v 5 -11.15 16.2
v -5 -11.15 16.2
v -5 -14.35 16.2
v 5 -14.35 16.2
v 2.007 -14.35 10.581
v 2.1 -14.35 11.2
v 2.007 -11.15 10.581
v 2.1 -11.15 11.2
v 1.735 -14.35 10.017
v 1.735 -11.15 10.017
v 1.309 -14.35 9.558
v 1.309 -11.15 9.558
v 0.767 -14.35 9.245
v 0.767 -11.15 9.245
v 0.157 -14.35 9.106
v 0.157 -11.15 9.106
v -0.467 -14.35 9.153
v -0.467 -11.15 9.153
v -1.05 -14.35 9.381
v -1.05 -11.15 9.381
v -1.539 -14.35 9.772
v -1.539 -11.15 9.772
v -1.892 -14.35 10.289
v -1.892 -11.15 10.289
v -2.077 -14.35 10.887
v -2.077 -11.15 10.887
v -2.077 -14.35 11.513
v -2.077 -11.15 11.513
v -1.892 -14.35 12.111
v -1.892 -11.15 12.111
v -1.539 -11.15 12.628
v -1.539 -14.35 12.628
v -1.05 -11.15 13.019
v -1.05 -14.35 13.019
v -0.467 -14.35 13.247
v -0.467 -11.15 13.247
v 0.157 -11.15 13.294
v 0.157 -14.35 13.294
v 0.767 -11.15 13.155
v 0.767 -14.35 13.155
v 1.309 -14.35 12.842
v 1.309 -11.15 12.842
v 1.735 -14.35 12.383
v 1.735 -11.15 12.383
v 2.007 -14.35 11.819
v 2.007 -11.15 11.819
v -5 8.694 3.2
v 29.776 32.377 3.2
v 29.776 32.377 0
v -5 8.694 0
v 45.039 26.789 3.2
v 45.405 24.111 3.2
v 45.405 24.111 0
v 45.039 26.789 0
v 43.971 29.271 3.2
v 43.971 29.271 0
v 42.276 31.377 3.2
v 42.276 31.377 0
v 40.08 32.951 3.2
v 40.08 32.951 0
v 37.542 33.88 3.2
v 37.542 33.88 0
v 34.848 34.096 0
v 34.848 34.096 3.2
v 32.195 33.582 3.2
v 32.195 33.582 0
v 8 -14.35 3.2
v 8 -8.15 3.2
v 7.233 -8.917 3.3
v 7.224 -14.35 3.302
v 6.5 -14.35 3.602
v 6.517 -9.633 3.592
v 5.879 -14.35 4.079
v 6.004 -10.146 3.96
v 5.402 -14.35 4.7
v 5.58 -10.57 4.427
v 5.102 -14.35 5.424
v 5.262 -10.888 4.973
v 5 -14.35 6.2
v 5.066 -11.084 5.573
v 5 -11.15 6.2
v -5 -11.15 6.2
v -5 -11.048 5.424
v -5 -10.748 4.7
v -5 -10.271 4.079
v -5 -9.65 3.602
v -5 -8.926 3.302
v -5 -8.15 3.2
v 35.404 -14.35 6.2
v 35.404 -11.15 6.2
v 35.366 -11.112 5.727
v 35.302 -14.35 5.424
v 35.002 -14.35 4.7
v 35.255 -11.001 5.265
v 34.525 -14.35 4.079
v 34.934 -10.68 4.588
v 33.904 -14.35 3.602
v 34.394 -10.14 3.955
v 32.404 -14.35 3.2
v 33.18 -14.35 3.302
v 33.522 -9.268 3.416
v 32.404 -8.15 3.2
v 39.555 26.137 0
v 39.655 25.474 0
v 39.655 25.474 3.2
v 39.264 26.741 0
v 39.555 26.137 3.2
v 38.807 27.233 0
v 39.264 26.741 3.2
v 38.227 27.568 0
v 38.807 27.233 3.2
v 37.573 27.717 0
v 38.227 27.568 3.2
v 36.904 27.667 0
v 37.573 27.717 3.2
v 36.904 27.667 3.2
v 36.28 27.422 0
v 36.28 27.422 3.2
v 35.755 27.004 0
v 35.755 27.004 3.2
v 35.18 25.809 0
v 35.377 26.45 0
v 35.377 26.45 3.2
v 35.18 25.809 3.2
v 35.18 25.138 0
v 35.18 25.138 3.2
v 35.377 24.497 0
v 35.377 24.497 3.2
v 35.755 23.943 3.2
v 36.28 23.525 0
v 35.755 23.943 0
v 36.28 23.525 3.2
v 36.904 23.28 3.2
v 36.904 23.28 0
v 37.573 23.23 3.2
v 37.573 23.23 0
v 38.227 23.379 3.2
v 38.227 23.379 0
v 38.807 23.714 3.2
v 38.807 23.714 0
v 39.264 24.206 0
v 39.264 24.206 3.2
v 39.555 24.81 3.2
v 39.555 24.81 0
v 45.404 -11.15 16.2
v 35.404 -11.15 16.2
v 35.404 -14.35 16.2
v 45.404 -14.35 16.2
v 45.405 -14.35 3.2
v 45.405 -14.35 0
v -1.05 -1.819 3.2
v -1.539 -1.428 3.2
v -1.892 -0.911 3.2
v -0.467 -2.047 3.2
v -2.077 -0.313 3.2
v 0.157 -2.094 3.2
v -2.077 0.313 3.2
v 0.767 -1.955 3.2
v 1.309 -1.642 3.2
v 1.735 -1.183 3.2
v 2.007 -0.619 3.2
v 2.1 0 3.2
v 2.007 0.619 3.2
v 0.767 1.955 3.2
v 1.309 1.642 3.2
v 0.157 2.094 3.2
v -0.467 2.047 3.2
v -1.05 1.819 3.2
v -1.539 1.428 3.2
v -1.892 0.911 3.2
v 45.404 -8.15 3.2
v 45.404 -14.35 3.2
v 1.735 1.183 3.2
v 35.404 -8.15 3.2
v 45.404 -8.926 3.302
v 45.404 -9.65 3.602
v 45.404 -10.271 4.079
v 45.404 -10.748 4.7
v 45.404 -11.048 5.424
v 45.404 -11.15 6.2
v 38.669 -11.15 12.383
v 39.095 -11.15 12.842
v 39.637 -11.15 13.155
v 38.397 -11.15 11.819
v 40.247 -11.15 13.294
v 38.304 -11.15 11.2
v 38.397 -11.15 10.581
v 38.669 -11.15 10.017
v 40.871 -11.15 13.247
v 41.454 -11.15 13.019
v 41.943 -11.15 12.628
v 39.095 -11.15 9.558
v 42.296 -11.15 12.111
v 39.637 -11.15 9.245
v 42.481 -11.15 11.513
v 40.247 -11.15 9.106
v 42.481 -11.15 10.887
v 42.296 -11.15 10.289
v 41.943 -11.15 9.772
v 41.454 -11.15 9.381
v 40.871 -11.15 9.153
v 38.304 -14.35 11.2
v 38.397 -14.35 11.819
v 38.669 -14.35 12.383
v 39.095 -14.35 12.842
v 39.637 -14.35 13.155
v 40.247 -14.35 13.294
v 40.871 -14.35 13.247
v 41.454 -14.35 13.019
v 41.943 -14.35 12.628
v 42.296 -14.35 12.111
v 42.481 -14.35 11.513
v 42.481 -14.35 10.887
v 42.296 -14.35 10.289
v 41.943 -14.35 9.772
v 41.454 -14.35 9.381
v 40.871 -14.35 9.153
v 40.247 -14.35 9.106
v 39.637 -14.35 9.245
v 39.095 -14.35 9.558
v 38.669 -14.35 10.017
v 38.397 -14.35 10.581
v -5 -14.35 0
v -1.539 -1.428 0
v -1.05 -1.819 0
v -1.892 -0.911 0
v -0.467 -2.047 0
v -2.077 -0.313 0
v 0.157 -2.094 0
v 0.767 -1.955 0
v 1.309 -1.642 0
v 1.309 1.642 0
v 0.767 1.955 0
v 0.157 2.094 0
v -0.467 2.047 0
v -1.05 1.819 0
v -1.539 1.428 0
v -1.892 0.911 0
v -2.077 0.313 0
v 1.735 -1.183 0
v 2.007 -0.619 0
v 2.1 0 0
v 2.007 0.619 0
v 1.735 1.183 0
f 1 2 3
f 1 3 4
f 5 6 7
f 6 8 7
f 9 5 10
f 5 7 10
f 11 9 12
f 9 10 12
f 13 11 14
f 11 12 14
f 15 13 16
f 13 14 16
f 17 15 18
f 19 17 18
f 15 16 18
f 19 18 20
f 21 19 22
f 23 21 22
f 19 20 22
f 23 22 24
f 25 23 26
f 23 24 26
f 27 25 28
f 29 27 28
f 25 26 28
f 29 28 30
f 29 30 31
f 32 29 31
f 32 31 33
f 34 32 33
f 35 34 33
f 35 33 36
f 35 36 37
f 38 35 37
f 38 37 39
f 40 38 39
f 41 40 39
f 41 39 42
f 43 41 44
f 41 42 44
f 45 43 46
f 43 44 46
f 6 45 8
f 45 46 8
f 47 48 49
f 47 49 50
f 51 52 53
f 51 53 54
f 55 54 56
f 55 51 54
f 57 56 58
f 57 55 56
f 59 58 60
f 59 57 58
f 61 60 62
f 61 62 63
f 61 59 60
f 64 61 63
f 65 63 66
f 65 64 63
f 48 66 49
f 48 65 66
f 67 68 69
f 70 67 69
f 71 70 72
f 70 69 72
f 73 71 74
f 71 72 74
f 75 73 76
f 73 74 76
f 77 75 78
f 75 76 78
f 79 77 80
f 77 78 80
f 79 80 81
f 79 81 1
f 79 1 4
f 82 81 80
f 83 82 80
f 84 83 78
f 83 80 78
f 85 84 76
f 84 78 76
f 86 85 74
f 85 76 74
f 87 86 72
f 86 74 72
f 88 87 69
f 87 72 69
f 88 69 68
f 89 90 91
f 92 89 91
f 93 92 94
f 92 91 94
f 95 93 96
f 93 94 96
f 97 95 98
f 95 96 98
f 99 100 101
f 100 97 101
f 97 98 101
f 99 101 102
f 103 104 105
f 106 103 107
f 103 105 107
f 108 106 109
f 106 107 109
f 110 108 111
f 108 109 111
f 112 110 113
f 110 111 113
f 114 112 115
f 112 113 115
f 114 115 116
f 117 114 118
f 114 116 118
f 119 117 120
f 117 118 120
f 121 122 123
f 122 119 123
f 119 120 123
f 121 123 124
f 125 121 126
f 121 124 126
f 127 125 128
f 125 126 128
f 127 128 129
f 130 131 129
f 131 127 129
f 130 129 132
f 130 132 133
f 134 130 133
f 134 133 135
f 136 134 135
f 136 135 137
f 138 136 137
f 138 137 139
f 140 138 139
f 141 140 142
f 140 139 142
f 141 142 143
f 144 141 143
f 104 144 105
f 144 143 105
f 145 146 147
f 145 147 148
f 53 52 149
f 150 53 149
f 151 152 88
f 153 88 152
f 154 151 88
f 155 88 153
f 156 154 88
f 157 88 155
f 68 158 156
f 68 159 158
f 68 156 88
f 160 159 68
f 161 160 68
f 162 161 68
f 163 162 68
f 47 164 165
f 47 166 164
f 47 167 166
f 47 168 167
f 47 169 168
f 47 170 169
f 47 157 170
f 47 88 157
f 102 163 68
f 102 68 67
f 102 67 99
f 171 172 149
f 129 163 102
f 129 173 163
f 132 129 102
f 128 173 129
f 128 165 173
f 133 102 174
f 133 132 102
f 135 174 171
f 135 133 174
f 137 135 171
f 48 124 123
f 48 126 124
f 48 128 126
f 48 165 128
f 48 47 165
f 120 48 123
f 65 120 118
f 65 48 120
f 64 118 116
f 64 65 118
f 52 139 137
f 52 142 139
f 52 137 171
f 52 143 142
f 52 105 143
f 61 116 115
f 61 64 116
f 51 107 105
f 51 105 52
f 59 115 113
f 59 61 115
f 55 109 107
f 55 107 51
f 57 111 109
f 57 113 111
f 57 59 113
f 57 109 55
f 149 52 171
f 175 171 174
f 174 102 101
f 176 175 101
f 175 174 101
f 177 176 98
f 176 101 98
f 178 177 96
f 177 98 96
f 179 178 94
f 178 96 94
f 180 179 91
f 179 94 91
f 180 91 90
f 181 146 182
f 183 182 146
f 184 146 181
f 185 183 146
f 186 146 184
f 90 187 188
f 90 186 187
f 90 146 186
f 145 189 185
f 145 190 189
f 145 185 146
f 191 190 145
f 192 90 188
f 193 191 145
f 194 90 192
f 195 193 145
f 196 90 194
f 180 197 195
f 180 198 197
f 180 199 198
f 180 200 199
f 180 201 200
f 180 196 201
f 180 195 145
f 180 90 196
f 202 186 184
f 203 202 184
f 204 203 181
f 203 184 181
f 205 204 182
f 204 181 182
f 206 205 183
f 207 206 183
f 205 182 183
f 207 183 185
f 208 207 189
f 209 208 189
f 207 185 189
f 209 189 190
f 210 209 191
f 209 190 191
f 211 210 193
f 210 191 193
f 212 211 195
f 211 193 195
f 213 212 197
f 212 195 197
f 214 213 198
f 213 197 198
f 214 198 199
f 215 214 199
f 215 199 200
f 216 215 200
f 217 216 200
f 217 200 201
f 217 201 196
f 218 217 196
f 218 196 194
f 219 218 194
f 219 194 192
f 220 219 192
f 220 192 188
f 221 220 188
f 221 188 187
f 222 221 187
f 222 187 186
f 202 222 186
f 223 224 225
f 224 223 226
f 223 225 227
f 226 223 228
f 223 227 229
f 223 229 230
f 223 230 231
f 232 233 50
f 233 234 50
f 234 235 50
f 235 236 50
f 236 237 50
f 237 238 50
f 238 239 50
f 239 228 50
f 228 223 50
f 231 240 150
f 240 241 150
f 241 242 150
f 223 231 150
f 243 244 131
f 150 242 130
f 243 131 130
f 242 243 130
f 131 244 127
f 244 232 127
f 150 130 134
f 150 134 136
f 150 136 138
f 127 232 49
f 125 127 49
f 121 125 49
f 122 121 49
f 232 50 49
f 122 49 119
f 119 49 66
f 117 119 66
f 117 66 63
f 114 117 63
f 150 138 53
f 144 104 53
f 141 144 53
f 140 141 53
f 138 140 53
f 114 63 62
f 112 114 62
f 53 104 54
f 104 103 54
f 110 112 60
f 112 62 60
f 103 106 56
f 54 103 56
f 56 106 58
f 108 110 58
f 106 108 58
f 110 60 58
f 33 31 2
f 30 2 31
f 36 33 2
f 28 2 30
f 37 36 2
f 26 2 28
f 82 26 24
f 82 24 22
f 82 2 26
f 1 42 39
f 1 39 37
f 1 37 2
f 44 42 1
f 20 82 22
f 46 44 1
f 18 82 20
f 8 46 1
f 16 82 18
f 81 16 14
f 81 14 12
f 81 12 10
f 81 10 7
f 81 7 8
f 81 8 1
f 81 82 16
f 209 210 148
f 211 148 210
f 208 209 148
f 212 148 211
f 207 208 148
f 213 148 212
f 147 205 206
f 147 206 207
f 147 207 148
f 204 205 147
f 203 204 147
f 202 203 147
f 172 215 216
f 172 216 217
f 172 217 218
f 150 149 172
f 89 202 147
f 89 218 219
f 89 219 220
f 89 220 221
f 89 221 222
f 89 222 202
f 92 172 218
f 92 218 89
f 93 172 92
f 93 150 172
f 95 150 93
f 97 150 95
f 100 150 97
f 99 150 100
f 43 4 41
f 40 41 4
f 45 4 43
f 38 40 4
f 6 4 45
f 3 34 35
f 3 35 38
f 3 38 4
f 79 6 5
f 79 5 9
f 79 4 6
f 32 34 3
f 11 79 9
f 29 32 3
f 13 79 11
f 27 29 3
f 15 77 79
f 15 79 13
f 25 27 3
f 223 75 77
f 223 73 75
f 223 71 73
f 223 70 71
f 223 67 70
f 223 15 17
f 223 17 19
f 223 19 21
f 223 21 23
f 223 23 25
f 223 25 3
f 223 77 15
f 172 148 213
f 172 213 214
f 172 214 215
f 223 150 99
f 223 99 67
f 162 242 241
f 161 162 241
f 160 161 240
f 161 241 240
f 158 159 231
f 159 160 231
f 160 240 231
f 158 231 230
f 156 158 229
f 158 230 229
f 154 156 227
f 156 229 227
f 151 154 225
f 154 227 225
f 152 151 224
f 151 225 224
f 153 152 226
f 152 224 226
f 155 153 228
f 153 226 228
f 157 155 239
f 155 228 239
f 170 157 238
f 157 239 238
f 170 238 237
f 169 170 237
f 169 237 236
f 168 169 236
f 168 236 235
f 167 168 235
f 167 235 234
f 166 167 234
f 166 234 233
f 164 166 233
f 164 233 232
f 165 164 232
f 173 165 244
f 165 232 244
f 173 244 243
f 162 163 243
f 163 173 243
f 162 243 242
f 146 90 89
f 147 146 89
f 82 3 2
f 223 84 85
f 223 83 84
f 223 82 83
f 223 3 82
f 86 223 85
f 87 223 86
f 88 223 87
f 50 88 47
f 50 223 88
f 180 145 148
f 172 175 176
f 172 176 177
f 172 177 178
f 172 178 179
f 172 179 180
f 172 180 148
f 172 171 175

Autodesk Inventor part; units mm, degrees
ref_plane "YZ Plane" through (0, 0, 0) normal (1, 0, 0) x (0, 1, 0)
ref_plane "XZ Plane" through (0, 0, 0) normal (0, 1, 0) x (-1, 0, 0)
ref_plane "XY Plane" through (0, 0, 0) normal (0, 0, 1) x (1, 0, 0)
sketch "Эскиз1" plane through (0, 0, 0) normal (0, 0, 1) x (1, 0, 0)
  circle A0 centre (0, 0) radius 2.1
  line L0 (-5, 14.35) -> (5, 14.35)
  line L1 (5, 14.35) -> (5, -14.35)
  line L2 (5, -14.35) -> (-5, -14.35)
  line L3 (-5, -14.35) -> (-5, 14.35)
  line L4 (-5, 14.35) -> (5, -14.35) construction
  line L5 (5, 14.35) -> (-5, -14.35) construction
  line L6 (-5, 7) -> (5, 7)
  dimension "d0" = 4.2
  dimension "d2" = 10
  dimension "d3" = 28.7
  dimension "d4" = 7
extrude "Выдавливание1" add sketch "Эскиз1" along normal blind 3.2 contours L6 L1 L2 L3
sketch "Эскиз2" plane through (0, 0, 3.2) normal (0, 0, 1) x (1, 0, 0)
  line L0 (5, -14.35) -> (5, 7) projected
  line L1 (5, -14.35) -> (-5, -14.35)
  line L2 (-5, -14.35) -> (-5, -11.15)
  line L3 (-5, -11.15) -> (5, -11.15)
  line L4 (5, -11.15) -> (5, -14.35)
  point P0 (0, 0)
  point P1 (5, -11.15)
  dimension "d7" = 10
  dimension "d8" = 3.2
extrude "Выдавливание2" add sketch "Эскиз2" along normal blind 13
fillet "Сопряжение1" radius 3 1 edges at (0, -11.15, 3.2)
sketch "Эскиз3" plane through (-5, -11.15, 16.2) normal (0, 1, 0) x (1, 0, 0)
  line L0 (0, 10) -> (10, 10) projected
  line L1 (5, 10) -> (5, 0)
  line L2 (0, 0) -> (10, 0) projected
  circle A0 centre (5, 5) radius 2.1
  point P0 (5, 16.2)
  dimension "d12" = 4.2
extrude "Выдавливание3" cut sketch "Эскиз3" against normal blind 13
sketch "Эскиз4" plane through (0, 0, 3.2) normal (0, 0, 1) x (1, 0, 0)
  circle A0 centre (37.4046, 25.4735) radius 2.6917 projected
  line L0 (35.1798, 23.9584) -> (0, 0)
  line L1 (29.7757, 32.3768) -> (-5, 8.6936)
  line L2 (-5, 7) -> (-5, -8.15) projected
  line L3 (-5, 7) -> (-5, 8.6936)
  line L4 (-5, -14.35) -> (5, -14.35) projected
  line L5 (5, -14.35) -> (5, -11.15) projected
  line L6 (5, -11.15) -> (-5, -11.15) projected
  line L7 (-5, -11.15) -> (-5, -14.35) projected
  line L8 (37.4046, 25.4735) -> (37.4046, -14.35)
  line L9 (45.4046, 24.1114) -> (45.4046, -14.35)
  arc A1 (45.4046, 24.1114) -> (29.7757, 32.3768) centre (35.4046, 24.1114) ccw
  line L10 (-5, -14.35) -> (45.4046, -14.35)
  circle A2 centre (37.4046, 25.4735) radius 2.25
  line L11 (-5, 8.6936) -> (-5, -14.35)
  circle A3 centre (0, 0) radius 2.1 projected
  dimension "d15" = 10
  dimension "d16" = 8
  dimension "d17" = 10
  dimension "d18" = 4.5
extrude "Выдавливание4" add sketch "Эскиз4" against normal up to surface (3.2 mm away) contours A0 | A1 L9 L10 L5 L6 L11 L2 L3 L1
fillet "Сопряжение2" radius 3 1 edges at (5, -11.25, 3.2)
ref_plane "РабПлоскость1" through (20.202, -14.35, 16.2) normal (-1, 0, 0) x (0, 0, 1)
mirror "Зеркальное отражение1" about plane through (20.202, -14.35, 16.2) normal (-1, 0, 0) of "Выдавливание2", "Выдавливание3", "Сопряжение1", "Сопряжение2"
properties part number "мертвое колесо 3"
